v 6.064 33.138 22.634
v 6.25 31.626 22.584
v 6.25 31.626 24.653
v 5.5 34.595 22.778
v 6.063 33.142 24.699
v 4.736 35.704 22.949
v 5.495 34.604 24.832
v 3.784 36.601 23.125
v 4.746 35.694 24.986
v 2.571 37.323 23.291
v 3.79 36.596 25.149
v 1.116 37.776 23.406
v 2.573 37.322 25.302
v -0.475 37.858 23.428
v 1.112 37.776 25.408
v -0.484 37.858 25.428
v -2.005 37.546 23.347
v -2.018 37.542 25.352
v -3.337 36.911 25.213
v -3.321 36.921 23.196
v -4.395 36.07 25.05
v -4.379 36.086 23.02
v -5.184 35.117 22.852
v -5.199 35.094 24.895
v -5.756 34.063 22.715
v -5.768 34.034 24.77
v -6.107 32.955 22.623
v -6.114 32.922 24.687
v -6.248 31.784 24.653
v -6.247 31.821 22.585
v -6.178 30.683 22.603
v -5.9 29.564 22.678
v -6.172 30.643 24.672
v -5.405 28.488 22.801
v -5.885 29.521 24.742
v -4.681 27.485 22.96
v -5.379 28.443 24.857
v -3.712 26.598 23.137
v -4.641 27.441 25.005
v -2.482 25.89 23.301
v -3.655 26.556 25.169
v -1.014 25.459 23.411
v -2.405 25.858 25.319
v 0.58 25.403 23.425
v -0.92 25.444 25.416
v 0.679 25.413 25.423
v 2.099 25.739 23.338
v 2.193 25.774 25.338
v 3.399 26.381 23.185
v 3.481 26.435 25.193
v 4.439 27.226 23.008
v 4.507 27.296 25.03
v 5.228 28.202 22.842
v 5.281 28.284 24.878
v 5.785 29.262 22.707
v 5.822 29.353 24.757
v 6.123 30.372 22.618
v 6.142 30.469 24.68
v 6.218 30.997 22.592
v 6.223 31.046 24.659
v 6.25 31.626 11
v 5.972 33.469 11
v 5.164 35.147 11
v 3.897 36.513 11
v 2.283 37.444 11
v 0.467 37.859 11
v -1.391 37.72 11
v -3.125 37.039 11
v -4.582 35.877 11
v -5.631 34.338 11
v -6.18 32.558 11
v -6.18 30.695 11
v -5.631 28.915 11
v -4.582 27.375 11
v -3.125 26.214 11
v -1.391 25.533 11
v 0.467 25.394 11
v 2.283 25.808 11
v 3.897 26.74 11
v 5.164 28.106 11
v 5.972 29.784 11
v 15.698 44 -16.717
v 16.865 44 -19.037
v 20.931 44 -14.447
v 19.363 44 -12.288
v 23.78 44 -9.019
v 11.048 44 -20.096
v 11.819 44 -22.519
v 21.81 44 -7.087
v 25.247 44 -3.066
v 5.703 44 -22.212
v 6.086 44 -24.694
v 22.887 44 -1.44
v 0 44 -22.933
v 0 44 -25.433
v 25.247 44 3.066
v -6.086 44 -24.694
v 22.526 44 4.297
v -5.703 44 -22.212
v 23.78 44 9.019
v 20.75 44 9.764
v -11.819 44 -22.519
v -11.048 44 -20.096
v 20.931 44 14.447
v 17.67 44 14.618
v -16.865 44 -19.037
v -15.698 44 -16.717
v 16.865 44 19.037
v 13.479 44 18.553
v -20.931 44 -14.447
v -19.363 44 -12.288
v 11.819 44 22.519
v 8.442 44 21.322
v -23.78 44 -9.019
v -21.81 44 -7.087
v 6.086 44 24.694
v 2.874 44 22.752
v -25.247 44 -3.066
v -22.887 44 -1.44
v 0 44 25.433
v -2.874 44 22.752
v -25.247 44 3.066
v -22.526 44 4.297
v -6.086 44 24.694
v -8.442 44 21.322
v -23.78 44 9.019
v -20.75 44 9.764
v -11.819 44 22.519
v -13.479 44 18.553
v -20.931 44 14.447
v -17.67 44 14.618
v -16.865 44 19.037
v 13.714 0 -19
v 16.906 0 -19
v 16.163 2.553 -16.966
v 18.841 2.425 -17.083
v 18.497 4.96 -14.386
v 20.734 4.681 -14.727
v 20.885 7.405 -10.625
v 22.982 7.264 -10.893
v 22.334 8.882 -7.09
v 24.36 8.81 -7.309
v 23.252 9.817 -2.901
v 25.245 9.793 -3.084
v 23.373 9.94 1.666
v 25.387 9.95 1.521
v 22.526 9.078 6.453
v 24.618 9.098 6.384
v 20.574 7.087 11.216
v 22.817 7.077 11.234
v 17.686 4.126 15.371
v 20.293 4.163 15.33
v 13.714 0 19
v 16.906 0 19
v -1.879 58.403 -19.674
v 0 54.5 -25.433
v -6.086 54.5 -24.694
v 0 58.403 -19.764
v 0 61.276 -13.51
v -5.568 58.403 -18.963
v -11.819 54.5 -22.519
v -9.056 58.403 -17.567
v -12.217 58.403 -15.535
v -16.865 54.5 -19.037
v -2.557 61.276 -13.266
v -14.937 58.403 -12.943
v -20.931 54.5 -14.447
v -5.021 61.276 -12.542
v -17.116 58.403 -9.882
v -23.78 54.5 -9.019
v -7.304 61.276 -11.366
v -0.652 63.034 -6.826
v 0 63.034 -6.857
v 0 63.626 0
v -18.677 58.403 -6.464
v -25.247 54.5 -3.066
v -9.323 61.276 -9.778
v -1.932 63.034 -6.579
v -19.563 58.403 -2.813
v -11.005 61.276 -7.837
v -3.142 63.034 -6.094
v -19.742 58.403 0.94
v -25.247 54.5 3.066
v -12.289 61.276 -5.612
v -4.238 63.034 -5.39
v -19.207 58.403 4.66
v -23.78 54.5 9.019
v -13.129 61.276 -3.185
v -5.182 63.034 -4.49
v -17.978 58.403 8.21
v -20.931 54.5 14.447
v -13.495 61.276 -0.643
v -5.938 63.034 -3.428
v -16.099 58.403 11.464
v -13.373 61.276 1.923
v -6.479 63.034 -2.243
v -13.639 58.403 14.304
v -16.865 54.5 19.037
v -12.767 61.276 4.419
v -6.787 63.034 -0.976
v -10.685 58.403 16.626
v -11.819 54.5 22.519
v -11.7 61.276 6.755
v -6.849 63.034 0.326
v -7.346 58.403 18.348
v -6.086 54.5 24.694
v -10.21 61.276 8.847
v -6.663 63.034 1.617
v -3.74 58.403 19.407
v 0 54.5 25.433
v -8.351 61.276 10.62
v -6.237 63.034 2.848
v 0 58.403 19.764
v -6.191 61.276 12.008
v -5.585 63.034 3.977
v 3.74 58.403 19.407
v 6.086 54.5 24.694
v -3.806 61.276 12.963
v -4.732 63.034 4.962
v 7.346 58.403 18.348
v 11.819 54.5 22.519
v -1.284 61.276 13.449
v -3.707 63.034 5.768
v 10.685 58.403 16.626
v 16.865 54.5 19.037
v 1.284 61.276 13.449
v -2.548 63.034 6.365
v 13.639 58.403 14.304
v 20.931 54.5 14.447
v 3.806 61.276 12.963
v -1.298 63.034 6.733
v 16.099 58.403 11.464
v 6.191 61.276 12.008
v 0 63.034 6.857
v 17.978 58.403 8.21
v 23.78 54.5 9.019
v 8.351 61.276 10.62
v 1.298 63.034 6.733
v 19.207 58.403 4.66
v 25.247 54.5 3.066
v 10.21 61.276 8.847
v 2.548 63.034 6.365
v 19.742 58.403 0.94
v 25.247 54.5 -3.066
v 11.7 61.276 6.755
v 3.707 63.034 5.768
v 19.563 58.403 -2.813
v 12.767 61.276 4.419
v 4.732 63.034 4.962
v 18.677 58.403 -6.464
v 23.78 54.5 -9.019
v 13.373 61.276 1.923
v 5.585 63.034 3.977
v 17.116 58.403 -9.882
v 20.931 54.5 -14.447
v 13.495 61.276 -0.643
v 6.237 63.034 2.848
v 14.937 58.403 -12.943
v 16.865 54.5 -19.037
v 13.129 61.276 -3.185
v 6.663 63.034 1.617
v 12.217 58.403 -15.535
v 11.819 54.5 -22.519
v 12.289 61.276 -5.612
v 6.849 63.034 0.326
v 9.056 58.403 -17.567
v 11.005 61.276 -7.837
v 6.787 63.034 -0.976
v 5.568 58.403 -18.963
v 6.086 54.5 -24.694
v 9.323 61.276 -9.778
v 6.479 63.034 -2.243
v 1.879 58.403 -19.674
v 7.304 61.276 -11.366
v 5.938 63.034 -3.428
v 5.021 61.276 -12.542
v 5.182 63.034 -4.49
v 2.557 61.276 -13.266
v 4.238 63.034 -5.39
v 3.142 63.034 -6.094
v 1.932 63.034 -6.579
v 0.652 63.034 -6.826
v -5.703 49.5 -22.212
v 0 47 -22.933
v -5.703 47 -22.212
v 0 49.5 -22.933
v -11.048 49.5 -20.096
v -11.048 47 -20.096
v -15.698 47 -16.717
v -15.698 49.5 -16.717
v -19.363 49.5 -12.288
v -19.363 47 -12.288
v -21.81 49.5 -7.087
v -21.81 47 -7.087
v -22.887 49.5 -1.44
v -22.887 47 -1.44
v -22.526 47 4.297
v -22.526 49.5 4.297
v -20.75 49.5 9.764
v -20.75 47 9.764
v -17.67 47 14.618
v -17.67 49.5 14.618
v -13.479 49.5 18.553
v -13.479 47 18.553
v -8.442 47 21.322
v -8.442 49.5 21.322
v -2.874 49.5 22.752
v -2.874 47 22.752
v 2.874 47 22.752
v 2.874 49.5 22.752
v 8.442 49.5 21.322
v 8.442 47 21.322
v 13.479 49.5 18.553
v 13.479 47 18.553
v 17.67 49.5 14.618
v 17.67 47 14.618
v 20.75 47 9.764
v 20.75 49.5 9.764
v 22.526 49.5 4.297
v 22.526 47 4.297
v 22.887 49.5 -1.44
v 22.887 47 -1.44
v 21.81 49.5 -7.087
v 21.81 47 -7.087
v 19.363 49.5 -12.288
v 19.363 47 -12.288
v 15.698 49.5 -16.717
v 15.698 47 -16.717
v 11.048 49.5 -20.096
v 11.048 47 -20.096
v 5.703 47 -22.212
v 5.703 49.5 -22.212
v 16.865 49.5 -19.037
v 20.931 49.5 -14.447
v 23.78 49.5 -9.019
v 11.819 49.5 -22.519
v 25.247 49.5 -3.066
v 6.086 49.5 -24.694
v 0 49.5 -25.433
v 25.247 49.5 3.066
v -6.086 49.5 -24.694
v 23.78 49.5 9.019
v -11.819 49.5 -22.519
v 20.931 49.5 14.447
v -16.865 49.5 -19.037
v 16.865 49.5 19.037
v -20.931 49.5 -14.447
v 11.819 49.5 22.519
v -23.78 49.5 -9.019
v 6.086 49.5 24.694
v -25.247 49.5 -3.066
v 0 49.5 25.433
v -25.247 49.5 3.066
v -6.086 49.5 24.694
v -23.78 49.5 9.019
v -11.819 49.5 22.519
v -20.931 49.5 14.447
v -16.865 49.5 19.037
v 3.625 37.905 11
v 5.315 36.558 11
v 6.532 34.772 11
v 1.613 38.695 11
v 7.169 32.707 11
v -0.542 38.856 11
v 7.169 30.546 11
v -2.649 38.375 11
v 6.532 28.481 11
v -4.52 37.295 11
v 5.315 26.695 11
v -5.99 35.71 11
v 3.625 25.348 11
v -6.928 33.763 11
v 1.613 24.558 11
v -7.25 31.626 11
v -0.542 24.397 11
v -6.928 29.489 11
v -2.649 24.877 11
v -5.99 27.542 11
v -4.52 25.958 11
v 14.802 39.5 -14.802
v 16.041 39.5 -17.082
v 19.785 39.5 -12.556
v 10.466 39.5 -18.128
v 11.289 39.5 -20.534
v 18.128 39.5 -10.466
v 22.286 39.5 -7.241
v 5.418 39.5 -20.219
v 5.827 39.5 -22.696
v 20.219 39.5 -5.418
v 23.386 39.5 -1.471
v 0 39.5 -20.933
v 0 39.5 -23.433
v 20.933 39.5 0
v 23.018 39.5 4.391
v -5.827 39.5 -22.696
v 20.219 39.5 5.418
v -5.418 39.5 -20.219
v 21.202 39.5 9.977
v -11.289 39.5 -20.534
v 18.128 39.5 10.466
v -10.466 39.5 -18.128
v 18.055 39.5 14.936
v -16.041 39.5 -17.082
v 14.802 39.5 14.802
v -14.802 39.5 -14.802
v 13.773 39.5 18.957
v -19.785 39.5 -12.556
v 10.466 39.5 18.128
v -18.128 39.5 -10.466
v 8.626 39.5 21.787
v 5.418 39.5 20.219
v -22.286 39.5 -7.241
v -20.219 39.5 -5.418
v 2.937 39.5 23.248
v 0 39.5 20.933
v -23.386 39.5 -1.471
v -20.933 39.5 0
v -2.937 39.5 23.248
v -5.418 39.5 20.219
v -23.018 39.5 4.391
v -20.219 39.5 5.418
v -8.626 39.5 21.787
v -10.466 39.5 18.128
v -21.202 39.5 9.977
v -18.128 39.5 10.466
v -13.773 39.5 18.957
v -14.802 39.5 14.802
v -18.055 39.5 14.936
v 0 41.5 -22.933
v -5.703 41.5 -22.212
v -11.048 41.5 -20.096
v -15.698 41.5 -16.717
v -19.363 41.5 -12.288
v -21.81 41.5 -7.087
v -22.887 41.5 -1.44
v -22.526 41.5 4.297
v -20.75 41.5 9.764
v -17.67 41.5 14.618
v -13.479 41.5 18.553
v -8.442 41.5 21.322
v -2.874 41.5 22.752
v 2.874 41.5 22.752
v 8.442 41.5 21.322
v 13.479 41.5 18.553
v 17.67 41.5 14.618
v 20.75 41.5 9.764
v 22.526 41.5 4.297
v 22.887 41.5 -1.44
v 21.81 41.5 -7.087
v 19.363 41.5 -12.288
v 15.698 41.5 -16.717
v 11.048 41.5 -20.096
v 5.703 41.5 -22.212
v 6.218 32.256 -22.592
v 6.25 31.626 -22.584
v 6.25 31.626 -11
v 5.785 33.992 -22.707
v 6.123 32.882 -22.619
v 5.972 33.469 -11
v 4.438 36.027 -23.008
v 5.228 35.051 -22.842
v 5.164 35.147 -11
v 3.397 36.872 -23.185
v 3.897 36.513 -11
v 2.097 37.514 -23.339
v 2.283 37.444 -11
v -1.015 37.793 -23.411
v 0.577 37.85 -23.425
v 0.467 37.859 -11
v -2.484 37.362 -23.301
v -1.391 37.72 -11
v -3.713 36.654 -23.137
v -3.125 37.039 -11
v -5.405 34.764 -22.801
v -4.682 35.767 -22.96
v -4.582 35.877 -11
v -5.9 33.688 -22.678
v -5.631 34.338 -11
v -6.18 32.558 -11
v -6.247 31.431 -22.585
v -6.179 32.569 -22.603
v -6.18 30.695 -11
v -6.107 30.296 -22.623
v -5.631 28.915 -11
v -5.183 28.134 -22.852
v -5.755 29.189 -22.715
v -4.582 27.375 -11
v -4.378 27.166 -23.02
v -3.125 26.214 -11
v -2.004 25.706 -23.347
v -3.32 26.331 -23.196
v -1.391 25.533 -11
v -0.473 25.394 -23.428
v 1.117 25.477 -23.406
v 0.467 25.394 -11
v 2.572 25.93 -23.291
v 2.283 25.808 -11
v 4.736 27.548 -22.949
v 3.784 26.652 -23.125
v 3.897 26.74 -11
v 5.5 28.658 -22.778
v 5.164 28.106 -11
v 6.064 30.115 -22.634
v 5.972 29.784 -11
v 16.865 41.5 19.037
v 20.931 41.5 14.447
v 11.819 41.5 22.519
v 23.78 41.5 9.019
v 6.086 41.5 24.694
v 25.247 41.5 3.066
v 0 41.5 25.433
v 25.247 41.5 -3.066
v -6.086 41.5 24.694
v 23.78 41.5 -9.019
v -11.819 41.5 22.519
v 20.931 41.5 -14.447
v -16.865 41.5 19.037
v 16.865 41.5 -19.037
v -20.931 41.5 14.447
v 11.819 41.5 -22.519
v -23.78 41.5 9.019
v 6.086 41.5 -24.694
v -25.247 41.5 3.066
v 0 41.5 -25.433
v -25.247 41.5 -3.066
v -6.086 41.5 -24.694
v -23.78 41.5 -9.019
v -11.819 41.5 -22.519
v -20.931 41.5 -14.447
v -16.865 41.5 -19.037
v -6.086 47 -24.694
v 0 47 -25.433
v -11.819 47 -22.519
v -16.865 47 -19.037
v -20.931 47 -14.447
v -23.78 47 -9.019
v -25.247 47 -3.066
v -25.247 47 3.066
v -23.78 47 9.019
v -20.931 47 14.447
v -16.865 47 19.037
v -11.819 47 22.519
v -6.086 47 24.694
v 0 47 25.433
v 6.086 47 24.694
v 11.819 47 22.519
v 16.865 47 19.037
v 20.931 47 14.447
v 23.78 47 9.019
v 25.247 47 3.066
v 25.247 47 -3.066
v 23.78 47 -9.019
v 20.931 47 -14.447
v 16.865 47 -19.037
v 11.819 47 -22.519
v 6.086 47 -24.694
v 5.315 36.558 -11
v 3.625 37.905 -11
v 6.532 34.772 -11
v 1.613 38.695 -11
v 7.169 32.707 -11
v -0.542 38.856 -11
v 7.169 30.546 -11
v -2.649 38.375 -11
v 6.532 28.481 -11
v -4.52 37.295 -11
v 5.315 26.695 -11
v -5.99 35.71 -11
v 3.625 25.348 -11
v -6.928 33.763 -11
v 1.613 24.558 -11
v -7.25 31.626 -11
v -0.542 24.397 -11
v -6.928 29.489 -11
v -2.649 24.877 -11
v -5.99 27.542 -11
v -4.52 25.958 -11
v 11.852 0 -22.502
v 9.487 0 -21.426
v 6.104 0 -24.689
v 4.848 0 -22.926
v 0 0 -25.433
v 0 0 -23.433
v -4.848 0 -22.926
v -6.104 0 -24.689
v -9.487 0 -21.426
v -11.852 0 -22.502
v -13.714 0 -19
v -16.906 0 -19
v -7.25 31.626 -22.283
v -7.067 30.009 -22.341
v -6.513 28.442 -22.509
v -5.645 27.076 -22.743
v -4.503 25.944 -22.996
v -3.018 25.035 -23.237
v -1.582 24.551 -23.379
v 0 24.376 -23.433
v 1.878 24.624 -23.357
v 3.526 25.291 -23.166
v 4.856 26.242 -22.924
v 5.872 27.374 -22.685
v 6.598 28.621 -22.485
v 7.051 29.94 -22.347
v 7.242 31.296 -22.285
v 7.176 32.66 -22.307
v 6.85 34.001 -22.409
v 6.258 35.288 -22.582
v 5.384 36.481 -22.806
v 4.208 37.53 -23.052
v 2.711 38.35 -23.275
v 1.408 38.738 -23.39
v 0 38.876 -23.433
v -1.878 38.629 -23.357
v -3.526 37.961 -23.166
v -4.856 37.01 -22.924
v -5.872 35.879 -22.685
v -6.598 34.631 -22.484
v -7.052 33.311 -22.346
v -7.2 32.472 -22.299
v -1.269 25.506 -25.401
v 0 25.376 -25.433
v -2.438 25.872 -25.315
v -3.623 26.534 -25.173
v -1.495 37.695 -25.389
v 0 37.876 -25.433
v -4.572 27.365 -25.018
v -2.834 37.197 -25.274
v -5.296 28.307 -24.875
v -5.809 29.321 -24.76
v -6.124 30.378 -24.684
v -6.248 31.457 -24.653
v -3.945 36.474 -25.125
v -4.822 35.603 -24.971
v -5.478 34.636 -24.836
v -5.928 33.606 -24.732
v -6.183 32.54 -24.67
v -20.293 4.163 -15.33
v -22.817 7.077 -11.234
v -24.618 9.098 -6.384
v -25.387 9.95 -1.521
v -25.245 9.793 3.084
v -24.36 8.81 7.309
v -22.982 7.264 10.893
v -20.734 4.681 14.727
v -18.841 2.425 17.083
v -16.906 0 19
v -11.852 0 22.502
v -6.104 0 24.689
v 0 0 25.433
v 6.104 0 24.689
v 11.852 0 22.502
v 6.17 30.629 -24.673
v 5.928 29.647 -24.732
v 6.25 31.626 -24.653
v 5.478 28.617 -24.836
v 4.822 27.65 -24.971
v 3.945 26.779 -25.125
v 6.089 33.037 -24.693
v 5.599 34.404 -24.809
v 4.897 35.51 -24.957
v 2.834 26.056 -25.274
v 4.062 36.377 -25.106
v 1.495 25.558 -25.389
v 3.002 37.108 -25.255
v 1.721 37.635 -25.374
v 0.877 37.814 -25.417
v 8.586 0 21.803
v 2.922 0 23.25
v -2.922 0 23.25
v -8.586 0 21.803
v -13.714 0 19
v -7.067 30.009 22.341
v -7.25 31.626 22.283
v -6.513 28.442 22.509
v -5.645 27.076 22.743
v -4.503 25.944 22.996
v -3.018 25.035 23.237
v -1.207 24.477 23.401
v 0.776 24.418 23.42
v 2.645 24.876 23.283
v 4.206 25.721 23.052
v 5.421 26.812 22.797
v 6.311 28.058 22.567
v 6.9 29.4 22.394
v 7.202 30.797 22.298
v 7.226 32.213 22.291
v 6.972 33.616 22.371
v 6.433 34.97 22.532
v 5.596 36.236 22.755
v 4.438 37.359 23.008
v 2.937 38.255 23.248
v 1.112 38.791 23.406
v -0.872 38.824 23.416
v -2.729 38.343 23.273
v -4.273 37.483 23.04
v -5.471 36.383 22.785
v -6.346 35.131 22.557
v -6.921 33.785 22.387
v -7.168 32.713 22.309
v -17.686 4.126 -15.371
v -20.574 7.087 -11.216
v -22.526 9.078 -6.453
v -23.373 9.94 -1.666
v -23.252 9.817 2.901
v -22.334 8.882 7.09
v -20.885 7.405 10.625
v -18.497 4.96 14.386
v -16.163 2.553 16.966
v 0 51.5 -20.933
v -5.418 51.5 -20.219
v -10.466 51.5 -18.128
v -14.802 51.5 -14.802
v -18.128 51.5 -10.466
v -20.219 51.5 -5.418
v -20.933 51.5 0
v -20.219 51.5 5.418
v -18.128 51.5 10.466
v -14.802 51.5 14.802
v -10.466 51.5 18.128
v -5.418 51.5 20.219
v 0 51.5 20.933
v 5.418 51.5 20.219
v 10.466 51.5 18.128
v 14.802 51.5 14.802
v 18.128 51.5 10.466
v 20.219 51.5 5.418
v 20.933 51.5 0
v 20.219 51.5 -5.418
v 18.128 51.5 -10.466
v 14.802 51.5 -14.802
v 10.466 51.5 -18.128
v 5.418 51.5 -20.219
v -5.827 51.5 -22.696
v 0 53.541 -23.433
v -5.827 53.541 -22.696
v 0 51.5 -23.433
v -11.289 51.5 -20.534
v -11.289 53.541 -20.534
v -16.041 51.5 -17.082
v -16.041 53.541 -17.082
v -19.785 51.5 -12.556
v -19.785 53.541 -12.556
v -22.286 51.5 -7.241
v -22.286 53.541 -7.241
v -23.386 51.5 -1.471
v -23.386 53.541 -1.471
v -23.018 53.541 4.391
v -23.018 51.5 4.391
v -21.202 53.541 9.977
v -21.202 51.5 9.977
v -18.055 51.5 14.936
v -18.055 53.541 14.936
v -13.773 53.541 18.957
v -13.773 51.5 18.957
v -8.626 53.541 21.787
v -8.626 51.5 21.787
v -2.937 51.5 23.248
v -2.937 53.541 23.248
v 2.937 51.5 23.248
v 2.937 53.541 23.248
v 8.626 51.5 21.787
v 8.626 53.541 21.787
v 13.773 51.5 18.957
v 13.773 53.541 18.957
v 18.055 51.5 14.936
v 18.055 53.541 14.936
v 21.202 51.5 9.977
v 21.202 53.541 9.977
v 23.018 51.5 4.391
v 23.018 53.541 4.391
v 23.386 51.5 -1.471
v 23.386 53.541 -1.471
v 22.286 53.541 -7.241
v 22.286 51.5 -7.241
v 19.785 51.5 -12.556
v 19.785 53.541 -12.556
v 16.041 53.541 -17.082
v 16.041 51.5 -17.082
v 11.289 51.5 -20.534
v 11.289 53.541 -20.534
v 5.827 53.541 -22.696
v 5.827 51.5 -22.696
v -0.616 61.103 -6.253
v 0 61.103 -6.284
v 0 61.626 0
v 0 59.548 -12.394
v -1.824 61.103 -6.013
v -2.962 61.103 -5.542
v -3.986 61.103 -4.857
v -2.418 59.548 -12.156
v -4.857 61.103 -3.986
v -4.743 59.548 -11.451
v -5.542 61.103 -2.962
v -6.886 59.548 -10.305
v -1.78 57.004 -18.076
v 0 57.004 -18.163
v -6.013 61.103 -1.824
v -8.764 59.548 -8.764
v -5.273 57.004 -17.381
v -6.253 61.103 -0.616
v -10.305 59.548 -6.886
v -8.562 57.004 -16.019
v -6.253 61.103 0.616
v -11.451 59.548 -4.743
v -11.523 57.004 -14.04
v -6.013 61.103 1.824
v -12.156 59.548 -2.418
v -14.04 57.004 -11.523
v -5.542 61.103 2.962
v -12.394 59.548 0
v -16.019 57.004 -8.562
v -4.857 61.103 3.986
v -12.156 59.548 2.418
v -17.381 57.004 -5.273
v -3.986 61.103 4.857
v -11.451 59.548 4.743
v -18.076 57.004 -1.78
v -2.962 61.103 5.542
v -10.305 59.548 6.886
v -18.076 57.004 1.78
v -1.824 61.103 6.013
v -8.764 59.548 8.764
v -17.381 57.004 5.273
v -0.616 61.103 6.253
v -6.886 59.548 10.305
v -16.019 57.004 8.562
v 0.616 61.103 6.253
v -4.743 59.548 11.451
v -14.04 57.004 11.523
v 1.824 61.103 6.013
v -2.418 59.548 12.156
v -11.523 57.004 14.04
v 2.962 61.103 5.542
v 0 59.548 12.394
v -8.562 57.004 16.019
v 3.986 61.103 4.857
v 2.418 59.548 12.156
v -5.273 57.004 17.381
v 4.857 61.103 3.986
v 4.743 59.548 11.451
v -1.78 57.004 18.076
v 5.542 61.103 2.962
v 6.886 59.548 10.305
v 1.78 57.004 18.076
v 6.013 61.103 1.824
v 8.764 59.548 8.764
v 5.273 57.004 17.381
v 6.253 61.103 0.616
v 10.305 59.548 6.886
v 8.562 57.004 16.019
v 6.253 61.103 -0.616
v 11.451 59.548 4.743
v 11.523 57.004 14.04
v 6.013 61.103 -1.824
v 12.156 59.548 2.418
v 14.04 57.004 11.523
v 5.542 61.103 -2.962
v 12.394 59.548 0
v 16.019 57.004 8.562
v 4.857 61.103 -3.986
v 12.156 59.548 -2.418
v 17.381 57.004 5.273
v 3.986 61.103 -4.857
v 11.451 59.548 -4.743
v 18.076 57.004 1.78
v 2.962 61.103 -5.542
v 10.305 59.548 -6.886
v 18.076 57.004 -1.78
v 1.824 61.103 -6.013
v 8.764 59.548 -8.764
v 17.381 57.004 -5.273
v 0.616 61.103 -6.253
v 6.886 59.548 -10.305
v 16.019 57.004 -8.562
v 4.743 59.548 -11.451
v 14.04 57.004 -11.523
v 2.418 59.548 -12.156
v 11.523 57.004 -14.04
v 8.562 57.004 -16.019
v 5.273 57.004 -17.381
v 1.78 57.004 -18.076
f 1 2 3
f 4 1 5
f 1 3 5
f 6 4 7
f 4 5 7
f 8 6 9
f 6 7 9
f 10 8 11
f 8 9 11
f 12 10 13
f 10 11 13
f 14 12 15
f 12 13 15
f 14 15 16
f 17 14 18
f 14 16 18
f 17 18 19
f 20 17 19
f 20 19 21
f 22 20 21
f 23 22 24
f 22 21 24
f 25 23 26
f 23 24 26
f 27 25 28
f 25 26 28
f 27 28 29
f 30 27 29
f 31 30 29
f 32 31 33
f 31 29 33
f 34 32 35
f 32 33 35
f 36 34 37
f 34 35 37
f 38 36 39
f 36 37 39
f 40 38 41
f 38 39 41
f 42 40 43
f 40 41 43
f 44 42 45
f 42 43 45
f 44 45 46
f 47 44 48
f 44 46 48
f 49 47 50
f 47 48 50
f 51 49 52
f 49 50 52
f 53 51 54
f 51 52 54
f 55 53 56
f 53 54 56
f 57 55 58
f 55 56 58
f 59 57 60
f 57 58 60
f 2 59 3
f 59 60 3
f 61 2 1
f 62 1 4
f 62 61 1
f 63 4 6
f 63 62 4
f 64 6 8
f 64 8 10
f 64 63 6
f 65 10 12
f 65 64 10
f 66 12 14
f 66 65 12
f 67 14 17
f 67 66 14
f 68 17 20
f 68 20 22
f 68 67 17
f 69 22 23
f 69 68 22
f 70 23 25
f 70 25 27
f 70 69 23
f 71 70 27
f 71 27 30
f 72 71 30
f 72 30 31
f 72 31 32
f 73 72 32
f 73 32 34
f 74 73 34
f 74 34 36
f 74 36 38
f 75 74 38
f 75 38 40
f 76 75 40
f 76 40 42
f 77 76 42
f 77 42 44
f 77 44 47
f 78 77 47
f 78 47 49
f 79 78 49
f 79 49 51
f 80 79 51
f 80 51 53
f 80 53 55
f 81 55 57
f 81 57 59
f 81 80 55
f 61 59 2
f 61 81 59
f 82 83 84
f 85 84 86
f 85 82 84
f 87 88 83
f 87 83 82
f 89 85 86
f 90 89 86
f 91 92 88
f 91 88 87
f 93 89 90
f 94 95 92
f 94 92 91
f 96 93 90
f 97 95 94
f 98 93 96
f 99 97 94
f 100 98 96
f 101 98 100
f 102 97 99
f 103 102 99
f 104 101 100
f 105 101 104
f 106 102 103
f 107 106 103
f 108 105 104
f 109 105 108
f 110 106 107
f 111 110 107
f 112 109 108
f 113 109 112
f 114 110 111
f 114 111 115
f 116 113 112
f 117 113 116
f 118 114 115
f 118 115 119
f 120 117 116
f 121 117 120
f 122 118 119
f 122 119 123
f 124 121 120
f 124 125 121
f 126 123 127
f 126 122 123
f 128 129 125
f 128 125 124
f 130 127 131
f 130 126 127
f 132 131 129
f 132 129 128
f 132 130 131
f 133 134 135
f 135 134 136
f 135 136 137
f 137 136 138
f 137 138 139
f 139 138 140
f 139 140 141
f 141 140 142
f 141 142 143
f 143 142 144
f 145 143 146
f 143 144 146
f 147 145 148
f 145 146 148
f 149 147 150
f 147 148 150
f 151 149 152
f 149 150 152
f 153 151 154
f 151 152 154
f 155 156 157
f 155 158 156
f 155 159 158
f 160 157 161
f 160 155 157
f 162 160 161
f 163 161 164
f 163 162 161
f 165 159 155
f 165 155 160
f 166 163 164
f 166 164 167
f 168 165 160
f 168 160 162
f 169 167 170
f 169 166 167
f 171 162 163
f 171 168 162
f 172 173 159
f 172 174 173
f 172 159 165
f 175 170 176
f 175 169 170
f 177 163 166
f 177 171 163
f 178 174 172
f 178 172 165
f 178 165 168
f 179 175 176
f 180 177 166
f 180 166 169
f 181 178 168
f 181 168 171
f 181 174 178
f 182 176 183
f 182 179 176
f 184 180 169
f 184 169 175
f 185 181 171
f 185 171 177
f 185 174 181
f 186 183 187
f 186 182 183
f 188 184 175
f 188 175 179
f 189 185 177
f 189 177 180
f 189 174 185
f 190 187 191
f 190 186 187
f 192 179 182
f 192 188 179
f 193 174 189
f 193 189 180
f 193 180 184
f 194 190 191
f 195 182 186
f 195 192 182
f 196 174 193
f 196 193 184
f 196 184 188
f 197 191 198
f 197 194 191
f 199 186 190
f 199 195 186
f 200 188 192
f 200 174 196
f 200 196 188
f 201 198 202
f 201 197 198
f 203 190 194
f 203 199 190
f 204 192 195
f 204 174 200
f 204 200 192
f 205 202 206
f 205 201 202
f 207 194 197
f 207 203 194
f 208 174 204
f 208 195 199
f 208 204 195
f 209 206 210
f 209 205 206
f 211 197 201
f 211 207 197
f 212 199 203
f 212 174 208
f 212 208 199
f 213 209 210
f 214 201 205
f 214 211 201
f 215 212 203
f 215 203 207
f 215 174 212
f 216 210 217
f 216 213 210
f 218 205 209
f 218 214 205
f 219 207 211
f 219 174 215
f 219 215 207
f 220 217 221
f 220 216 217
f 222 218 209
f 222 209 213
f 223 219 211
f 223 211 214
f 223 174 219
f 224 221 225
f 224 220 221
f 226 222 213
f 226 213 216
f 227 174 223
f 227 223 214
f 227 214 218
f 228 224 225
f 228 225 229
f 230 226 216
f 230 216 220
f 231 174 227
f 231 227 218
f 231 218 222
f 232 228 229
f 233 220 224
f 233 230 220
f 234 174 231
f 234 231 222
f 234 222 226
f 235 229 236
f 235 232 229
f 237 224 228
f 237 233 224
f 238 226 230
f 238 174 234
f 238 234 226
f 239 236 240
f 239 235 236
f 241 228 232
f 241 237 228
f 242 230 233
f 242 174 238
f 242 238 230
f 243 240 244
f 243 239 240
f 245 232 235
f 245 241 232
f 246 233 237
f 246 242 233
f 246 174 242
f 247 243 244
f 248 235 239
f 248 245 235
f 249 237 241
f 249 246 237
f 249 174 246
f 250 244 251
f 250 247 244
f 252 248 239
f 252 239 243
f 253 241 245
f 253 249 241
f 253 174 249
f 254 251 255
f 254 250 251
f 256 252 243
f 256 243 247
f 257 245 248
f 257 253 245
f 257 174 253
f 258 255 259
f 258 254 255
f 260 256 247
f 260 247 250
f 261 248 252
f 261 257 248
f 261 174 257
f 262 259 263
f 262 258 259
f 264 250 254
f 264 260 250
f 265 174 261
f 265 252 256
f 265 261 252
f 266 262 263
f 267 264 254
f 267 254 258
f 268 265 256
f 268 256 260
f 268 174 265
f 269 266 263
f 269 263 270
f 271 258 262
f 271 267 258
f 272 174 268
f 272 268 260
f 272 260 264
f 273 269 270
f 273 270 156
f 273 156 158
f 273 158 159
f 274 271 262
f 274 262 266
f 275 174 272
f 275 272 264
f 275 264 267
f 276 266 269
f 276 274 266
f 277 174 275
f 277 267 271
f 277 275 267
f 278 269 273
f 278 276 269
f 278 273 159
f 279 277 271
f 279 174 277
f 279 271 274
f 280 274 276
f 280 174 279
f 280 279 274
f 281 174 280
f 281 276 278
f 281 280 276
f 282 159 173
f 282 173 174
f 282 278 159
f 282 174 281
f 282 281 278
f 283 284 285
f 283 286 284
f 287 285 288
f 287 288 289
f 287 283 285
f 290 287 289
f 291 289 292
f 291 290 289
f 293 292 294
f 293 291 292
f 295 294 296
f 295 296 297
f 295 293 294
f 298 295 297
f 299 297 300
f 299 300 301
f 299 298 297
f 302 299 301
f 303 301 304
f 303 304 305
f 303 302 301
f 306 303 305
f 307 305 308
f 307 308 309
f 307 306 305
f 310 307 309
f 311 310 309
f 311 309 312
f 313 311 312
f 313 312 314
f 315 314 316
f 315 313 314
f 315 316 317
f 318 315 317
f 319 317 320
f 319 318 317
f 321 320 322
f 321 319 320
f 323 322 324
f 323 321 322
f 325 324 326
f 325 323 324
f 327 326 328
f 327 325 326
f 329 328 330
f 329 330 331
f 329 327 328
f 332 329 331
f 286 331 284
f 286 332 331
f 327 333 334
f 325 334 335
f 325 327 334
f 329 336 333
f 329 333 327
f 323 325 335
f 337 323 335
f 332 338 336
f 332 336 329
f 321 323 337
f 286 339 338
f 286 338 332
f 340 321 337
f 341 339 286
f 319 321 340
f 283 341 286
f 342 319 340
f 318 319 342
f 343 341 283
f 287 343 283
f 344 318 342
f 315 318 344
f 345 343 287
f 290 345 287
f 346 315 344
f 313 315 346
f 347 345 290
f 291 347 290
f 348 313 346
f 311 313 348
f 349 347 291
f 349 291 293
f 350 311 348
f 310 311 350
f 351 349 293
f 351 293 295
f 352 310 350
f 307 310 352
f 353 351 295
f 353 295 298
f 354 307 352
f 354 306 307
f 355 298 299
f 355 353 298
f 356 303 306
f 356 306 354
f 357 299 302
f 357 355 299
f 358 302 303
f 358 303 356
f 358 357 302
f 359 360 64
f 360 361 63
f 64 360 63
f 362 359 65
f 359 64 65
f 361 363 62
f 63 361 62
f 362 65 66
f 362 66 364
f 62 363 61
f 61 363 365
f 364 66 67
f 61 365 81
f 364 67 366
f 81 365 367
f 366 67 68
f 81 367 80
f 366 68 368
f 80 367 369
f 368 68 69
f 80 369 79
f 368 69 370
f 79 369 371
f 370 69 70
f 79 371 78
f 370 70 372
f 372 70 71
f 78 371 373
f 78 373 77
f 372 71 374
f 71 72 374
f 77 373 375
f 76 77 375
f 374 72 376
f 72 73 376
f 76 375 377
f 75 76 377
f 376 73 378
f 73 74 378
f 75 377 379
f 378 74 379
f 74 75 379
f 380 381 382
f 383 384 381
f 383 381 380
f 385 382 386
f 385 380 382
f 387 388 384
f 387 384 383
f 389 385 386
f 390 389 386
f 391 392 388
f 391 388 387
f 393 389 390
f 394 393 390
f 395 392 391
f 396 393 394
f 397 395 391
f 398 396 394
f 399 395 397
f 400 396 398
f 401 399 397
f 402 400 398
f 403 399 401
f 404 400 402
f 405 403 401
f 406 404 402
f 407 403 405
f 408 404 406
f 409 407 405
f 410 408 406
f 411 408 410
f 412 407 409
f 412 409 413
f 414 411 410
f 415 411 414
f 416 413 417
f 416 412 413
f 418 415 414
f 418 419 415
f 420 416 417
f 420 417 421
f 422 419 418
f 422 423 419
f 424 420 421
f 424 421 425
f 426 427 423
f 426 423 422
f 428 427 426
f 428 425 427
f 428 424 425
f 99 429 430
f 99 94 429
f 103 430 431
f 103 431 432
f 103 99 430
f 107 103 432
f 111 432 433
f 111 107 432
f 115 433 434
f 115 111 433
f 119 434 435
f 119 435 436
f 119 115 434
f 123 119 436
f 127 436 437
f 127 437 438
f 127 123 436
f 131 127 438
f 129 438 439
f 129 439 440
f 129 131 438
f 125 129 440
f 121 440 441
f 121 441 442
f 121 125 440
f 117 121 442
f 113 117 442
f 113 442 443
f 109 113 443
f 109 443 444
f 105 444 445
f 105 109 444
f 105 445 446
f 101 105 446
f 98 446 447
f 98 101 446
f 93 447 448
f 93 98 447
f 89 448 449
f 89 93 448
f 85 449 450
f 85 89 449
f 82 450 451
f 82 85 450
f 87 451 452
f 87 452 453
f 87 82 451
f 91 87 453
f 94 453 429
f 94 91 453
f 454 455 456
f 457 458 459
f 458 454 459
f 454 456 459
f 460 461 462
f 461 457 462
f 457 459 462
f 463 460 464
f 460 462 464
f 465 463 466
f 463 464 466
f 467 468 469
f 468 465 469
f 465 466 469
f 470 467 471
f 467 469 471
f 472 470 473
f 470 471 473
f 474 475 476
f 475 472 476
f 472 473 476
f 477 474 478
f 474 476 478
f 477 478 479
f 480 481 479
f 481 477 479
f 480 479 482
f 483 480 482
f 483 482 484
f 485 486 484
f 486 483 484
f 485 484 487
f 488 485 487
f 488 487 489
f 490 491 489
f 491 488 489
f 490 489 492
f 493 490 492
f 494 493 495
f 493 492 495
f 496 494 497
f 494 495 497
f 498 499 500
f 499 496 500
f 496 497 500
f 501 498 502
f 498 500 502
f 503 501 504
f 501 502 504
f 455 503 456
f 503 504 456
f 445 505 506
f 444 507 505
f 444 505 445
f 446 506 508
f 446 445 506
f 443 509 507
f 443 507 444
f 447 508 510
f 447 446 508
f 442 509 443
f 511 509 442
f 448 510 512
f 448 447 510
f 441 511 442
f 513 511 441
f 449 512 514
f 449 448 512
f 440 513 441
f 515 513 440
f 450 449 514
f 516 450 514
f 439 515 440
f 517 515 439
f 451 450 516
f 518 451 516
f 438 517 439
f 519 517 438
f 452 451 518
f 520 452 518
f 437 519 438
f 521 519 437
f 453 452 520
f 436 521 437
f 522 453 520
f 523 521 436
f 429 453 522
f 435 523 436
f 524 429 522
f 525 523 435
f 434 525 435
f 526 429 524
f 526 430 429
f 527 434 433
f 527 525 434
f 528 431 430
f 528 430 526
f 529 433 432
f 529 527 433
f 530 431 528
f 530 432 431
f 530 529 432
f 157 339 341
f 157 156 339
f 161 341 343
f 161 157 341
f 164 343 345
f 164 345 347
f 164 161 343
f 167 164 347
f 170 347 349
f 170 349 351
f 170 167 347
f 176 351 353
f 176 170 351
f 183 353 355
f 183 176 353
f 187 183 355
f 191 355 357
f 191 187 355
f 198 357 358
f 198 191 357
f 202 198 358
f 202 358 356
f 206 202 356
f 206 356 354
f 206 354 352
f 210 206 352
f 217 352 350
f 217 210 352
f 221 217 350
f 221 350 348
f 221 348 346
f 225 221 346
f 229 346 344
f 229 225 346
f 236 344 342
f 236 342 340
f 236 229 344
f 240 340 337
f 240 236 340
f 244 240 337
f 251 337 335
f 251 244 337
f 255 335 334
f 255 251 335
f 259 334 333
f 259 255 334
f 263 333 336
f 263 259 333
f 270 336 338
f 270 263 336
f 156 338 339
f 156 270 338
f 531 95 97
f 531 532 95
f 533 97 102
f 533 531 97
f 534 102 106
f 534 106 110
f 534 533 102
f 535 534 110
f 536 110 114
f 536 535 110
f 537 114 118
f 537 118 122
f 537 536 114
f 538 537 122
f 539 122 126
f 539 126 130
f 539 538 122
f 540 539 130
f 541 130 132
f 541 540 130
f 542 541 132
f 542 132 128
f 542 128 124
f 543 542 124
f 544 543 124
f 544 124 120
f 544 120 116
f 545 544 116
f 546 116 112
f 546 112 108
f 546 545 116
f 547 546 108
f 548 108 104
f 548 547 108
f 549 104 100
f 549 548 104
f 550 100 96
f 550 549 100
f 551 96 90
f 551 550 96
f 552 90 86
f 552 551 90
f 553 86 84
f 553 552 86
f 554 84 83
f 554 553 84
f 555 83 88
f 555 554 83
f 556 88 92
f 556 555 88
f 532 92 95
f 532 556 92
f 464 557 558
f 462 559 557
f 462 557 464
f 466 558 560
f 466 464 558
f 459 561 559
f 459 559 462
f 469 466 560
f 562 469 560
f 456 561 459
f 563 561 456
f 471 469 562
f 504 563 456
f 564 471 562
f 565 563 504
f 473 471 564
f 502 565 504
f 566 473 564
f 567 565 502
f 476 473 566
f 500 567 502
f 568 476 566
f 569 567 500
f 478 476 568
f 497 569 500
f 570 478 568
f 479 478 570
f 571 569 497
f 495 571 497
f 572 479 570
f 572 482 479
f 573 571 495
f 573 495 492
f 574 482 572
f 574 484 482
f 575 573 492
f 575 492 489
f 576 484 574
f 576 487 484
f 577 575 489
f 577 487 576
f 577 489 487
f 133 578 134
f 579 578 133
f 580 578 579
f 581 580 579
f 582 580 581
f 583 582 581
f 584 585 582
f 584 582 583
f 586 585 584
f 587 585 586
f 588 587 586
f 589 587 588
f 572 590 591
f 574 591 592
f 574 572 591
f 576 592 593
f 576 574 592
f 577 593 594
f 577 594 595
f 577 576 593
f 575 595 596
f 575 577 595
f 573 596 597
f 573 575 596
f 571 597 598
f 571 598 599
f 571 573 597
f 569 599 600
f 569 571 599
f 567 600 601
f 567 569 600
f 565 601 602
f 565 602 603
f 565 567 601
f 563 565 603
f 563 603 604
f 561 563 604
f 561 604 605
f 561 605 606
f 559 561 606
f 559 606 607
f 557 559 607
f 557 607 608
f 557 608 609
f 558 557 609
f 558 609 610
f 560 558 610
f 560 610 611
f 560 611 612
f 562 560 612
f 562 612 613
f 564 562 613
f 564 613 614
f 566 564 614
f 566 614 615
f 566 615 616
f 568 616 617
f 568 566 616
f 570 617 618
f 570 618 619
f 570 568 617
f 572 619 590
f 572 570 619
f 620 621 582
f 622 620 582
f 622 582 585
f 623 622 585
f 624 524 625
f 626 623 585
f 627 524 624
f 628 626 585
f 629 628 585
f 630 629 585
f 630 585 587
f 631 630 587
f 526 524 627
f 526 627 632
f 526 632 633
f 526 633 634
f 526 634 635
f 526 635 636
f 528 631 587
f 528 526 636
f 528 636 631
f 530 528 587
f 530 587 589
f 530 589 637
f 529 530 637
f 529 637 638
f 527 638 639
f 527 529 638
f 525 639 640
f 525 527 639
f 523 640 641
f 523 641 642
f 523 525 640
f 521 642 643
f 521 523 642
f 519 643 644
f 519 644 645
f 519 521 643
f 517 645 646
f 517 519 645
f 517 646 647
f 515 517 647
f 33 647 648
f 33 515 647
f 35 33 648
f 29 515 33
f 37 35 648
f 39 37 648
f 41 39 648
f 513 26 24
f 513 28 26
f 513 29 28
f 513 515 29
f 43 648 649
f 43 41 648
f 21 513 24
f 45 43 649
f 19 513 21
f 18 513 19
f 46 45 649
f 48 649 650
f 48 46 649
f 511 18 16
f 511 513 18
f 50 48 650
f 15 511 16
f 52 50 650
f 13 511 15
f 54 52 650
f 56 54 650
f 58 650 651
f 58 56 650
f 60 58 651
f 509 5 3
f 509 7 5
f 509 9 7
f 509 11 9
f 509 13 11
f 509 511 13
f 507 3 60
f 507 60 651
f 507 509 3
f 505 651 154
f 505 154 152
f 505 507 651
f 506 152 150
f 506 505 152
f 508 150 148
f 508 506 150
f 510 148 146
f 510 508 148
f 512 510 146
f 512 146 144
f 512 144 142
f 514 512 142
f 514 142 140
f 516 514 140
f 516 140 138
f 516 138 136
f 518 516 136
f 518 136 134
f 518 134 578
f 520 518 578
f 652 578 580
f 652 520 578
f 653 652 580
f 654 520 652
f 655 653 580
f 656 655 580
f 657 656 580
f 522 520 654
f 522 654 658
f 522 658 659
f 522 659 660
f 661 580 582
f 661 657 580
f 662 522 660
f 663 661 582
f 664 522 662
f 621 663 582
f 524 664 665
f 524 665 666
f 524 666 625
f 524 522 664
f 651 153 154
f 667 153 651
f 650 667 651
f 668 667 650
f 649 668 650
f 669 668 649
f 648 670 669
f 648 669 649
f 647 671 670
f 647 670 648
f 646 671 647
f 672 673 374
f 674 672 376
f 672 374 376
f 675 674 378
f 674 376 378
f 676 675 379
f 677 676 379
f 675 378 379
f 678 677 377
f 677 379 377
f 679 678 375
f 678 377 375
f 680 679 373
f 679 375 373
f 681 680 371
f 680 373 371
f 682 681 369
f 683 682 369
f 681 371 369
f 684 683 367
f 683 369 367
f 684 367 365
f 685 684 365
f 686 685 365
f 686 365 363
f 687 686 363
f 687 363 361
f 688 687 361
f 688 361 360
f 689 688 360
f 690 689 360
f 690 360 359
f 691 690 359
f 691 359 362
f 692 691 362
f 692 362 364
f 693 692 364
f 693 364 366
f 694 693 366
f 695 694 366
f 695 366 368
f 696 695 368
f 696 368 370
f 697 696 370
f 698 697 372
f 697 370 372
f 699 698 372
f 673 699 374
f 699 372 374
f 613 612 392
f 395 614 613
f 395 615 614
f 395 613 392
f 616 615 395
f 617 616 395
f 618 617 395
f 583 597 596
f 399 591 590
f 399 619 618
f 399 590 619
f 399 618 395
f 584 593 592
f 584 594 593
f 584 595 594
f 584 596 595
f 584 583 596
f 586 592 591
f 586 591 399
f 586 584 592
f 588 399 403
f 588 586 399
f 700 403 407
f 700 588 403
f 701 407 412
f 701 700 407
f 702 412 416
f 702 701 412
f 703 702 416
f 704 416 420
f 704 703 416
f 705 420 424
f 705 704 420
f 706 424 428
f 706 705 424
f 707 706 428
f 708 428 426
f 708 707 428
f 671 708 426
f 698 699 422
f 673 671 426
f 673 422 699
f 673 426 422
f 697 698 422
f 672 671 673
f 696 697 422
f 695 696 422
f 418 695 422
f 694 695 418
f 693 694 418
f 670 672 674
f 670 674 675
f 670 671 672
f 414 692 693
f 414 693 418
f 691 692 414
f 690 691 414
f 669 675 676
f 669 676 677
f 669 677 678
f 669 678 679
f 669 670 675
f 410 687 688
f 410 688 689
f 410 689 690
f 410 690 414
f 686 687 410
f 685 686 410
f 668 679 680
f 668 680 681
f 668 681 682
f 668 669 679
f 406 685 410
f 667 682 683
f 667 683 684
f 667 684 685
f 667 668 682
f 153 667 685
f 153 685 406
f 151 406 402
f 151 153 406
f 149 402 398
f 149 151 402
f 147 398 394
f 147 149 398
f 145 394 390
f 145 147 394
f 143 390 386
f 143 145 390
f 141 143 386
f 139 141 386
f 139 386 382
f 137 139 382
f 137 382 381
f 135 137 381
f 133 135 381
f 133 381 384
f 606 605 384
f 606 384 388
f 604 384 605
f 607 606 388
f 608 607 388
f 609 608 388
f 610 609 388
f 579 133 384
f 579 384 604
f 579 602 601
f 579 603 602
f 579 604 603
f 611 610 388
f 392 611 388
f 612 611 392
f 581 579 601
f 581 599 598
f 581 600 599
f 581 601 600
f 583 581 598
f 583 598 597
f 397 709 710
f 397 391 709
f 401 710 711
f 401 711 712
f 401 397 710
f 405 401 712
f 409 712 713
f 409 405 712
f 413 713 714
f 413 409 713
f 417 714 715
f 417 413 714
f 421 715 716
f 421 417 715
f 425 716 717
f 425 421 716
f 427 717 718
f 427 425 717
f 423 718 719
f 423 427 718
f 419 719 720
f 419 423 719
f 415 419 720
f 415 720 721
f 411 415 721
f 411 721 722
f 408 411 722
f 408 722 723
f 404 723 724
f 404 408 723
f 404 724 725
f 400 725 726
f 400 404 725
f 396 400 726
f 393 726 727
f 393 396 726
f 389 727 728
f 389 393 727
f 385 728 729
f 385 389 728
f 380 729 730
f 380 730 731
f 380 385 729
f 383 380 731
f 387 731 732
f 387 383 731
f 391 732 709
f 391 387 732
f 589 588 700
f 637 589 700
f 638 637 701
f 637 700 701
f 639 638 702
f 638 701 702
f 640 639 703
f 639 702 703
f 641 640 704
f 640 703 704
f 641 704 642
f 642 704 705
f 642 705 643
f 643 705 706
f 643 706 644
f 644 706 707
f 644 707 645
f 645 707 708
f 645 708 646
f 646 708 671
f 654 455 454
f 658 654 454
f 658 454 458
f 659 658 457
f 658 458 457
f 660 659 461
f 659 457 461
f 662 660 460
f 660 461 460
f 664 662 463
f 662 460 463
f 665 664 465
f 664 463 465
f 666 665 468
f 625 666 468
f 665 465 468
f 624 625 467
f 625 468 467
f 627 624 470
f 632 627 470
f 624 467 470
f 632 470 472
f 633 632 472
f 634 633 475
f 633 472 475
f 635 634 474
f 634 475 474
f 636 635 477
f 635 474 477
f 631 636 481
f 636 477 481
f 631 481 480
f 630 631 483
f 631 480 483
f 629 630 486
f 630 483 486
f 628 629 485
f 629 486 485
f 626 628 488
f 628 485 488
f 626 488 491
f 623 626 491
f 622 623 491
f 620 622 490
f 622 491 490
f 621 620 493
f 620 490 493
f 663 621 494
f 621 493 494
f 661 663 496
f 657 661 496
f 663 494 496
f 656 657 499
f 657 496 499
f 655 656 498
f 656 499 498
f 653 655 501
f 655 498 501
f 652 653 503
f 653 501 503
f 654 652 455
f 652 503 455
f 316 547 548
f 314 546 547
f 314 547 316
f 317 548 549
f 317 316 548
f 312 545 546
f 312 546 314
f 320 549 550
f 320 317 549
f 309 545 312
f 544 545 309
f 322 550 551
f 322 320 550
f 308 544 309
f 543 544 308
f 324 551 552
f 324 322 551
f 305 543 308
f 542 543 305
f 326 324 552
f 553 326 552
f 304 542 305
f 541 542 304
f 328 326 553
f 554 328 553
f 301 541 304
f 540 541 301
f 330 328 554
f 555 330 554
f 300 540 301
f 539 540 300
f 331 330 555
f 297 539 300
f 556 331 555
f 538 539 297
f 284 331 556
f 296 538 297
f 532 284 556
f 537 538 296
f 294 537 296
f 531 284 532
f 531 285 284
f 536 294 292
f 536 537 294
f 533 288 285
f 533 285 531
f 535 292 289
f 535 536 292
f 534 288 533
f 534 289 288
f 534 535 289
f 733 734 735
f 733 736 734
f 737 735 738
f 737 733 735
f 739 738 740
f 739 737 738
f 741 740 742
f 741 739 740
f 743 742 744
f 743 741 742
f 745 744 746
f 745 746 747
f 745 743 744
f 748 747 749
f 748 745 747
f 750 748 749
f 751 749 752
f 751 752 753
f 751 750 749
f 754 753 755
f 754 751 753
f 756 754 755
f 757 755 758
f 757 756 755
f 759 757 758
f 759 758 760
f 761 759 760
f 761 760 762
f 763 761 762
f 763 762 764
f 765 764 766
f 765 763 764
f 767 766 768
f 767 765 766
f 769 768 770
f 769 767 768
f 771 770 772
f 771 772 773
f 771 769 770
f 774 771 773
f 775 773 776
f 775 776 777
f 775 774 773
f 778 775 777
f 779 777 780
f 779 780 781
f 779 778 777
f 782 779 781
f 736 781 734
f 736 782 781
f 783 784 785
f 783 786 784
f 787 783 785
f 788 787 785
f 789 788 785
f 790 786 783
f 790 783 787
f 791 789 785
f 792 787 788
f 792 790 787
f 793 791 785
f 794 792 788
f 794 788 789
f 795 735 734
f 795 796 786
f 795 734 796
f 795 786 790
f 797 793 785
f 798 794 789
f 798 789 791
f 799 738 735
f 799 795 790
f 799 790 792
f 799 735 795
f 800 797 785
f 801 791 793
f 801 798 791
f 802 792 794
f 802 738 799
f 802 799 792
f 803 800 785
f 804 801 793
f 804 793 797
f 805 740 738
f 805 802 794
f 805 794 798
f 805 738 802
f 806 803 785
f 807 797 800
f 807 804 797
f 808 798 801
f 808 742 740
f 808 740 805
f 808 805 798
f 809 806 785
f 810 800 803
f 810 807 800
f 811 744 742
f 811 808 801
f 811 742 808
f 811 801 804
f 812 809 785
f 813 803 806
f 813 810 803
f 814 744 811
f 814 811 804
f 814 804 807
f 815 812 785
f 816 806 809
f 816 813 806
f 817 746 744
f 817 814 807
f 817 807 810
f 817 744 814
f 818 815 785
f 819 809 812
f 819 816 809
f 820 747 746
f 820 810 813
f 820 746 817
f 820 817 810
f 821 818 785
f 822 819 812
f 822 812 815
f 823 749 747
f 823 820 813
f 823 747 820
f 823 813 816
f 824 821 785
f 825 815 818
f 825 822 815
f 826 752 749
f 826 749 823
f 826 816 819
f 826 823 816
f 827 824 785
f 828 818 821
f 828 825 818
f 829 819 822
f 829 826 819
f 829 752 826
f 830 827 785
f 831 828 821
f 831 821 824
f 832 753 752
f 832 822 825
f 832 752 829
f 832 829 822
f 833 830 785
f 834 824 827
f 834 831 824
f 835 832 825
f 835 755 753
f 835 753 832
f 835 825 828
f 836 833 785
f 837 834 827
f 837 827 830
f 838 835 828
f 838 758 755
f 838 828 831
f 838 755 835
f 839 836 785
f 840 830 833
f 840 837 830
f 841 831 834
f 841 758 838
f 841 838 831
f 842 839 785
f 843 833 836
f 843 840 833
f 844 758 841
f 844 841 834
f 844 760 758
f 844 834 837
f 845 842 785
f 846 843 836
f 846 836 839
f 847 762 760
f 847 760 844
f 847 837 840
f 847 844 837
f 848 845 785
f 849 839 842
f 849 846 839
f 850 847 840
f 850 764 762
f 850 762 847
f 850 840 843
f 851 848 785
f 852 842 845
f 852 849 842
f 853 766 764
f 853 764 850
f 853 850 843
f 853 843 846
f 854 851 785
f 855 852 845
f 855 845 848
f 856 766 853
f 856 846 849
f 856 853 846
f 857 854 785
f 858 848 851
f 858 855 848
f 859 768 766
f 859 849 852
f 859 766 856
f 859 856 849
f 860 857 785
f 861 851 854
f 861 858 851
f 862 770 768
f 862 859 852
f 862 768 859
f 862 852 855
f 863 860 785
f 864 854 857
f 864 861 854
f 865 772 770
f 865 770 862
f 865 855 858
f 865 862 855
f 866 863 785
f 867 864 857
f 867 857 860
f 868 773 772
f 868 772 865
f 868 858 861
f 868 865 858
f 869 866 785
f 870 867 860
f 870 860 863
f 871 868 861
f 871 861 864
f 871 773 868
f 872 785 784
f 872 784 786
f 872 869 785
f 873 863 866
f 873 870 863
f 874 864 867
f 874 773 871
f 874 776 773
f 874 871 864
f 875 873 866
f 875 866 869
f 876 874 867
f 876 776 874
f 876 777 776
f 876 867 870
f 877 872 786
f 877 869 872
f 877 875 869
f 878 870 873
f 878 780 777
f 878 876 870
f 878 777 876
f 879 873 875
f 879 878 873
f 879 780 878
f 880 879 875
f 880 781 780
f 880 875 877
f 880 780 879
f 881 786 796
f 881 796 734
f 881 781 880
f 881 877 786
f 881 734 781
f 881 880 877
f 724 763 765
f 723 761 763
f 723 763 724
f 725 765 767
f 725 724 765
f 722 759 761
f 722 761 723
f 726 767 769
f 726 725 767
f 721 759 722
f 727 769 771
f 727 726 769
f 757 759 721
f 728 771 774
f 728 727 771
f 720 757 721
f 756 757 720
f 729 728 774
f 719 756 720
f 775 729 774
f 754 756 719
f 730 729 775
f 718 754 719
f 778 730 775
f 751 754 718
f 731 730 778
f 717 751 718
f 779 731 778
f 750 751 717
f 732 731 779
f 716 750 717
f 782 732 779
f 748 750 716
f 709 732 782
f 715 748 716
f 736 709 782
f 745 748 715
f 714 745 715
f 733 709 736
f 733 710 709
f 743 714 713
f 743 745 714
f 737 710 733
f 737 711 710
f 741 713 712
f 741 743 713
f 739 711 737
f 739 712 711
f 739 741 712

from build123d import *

# Parameters (mm, degrees)
CUT_EXTRUDE1_DEPTH       = 35
SKETCH3_R                = 6.25
CUT_EXTRUDE2_DEPTH       = 35
BOSS_EXTRUDE1_REACH      = 79.604
BOSS_EXTRUDE1_END_RADIUS = 23.432556387
SKETCH4_R                = 7.25
SKETCH4_R_2              = 6.25


with BuildPart() as part:
    # Sketch1 → Revolve1 (revolve)
    with BuildSketch(Plane.XY, mode=Mode.PRIVATE) as revolve1_sk:
        with BuildLine():
            Line((25.432556387, 0), (25.432556387, 41.5))
            Line((25.432556387, 41.5), (22.932556387, 41.5))
            Line((22.932556387, 41.5), (22.932556387, 44))
            Line((22.932556387, 44), (25.432556387, 44))
            Line((25.432556387, 44), (25.432556387, 47))
            Line((25.432556387, 47), (22.932556387, 47))
            Line((22.932556387, 47), (22.932556387, 49.5))
            Line((22.932556387, 49.5), (25.432556387, 49.5))
            Line((25.432556387, 49.5), (25.432556387, 54.5))
            ThreePointArc((25.432556387, 54.5), (13.510221664, 61.275659188), (0, 63.626304471))
            Line((0, 63.626304471), (0, 61.626304471))
            ThreePointArc((0, 61.626304471), (12.394048382, 59.548269405), (23.432556387, 53.541439456))
            Line((23.432556387, 53.541439456), (23.432556387, 51.5))
            Line((23.432556387, 51.5), (20.932556387, 51.5))
            Line((20.932556387, 51.5), (20.932556387, 45.5))
            Line((20.932556387, 45.5), (20.932556387, 39.5))
            Line((20.932556387, 39.5), (23.432556387, 39.5))
            Line((23.432556387, 39.5), (23.432556387, 0))
            Line((23.432556387, 0), (25.432556387, 0))
        make_face()
    revolve(revolve1_sk.sketch.rotate(Axis((0, 0, 0), (0, 1, 0)), 90), axis=Axis((0, 0, 0), (0, 1, 0)))

    # Sketch2 → Cut-Extrude1 (cut, symmetric)
    with BuildSketch(Plane(origin=(0, 0, 0), x_dir=(0, 0, -1), z_dir=(1, 0, 0))):
        with BuildLine():
            Line((-19, 0), (19, 0))
            ThreePointArc((19, 0), (0, 10), (-19, 0))
        make_face()
    extrude(amount=CUT_EXTRUDE1_DEPTH, both=True, mode=Mode.SUBTRACT)

    # Sketch3 → Cut-Extrude2 (cut, symmetric)
    with BuildSketch(Plane.XY):
        with Locations((0, 31.626304471)):
            Circle(SKETCH3_R)
    extrude(amount=CUT_EXTRUDE2_DEPTH, both=True, mode=Mode.SUBTRACT)

    # Boss-Extrude1: up to this cylinder (the profile starts inside it)
    boss_extrude1_end = Plane(origin=(0, 31.626304, 0), z_dir=(0, -1, 0)) * Cylinder(BOSS_EXTRUDE1_END_RADIUS, 207.073112775, mode=Mode.PRIVATE)
    # Sketch4 → Boss-Extrude1 (add, up to the surface)
    with BuildSketch(Plane.XY.offset(11), mode=Mode.PRIVATE) as boss_extrude1_sk1:
        with Locations(Location((0, 31.626304471, 0), (0, 0, 180))):
            Circle(SKETCH4_R)
        with Locations((0, 31.626304471)):
            Circle(SKETCH4_R_2, mode=Mode.SUBTRACT)
    boss_extrude1_tool1 = extrude(boss_extrude1_sk1.sketch, amount=BOSS_EXTRUDE1_REACH, mode=Mode.PRIVATE) & boss_extrude1_end
    boss_extrude1 = boss_extrude1_tool1.solids().sort_by_distance((7.044939, 31.626304, 11))[0]
    add(boss_extrude1)

    # Mirror1: Boss-Extrude1 across plane
    add(boss_extrude1.mirror(Plane.XY))


solid = part.part
